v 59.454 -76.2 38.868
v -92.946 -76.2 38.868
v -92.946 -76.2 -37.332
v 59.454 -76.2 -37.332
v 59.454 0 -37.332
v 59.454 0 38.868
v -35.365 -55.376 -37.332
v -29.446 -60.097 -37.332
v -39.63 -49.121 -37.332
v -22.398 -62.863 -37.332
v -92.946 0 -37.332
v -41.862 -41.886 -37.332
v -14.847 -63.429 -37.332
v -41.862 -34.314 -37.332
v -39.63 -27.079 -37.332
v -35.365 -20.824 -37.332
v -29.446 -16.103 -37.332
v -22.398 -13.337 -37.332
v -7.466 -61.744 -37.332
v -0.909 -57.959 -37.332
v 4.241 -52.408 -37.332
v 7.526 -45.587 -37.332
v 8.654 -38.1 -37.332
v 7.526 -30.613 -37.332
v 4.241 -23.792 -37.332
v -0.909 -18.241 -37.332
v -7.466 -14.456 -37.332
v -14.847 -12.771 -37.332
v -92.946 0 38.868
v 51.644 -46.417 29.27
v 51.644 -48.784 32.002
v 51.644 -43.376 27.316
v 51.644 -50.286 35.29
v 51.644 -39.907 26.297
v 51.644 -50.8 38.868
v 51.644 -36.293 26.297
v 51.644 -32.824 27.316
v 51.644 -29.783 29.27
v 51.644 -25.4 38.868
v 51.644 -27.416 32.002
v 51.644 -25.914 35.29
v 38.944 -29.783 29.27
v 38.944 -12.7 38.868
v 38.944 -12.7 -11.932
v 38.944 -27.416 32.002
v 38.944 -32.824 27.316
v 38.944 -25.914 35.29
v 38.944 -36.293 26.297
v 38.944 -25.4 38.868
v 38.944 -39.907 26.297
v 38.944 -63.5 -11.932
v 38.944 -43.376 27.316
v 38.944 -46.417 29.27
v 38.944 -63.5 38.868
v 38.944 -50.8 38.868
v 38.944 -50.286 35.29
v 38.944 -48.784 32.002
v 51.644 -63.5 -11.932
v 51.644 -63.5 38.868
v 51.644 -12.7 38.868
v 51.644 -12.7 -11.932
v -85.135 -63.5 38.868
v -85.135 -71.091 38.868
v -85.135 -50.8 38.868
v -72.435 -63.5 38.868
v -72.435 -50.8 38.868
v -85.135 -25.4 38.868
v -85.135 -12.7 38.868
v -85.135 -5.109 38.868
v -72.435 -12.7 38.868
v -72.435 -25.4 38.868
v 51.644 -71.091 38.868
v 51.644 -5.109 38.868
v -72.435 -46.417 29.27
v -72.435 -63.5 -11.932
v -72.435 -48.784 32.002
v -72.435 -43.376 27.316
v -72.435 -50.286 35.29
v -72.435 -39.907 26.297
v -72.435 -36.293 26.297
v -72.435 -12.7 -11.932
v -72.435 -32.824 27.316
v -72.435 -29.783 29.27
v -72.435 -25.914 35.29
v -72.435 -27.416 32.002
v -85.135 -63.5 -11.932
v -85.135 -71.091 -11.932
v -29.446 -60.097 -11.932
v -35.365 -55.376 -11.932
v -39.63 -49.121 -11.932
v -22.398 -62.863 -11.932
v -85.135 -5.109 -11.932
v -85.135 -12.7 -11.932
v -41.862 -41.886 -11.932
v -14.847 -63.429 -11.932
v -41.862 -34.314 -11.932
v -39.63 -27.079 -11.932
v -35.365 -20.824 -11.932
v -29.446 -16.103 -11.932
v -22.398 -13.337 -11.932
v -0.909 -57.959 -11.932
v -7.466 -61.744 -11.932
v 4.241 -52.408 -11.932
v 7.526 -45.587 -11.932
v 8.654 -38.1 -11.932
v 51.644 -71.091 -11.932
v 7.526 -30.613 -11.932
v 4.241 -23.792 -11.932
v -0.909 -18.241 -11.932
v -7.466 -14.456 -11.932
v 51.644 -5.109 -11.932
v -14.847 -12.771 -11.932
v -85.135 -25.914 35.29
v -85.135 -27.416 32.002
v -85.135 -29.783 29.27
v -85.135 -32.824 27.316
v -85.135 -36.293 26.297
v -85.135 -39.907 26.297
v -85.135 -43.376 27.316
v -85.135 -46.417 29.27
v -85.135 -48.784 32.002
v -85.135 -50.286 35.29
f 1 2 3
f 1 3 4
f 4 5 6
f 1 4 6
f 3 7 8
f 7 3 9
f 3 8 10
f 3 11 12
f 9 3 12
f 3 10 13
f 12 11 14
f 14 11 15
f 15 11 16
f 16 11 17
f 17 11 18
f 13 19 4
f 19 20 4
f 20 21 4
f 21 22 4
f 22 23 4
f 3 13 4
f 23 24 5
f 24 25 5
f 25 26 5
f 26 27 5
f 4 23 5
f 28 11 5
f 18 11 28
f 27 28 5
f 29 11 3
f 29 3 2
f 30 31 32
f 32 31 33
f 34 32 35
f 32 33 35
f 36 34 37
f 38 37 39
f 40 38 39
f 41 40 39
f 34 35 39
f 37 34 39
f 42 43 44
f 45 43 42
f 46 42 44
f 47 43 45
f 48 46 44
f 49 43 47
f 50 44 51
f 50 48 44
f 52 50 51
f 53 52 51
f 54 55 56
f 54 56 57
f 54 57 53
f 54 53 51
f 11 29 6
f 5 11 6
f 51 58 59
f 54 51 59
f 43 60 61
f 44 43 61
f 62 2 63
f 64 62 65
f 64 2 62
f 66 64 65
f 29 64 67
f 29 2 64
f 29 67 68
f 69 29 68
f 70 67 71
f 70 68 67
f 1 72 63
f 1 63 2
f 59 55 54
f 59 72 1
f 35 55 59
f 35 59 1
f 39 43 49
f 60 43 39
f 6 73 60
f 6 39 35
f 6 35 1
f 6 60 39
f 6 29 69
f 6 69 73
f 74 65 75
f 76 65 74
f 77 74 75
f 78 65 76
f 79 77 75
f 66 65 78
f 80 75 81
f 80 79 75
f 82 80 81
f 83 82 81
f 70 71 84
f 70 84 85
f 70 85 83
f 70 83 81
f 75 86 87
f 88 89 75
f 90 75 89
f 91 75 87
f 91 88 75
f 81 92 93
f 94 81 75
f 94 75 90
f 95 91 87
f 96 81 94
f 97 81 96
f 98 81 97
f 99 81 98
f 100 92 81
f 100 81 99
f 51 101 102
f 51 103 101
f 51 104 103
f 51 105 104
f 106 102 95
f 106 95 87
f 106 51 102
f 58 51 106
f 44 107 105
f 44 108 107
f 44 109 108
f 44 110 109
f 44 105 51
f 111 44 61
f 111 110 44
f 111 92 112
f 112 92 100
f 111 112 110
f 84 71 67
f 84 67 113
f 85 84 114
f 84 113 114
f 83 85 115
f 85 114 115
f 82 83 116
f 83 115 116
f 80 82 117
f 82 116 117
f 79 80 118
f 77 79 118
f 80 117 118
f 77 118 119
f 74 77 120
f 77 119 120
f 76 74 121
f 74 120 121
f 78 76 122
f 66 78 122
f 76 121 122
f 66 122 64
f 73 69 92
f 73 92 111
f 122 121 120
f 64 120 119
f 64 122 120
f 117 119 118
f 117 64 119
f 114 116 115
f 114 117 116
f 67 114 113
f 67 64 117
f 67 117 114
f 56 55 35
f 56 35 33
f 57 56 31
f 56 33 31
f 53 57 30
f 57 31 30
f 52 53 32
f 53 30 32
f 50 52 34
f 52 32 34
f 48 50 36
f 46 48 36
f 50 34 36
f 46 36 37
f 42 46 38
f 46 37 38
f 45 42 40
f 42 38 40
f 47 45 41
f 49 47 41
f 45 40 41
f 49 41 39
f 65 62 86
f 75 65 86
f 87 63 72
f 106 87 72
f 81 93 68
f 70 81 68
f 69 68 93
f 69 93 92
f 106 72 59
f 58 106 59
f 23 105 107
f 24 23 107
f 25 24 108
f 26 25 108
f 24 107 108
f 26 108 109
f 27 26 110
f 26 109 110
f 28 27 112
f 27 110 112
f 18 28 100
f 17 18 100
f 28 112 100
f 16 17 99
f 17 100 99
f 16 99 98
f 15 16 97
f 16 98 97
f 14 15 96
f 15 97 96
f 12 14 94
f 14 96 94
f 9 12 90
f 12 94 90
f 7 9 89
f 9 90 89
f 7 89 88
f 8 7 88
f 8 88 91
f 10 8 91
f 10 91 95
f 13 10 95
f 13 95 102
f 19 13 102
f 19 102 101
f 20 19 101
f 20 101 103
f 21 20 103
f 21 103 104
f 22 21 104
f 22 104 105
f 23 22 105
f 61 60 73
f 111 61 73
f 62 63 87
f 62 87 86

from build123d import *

# Parameters (mm, degrees)
F0_W     = 152.4
F0_H     = 76.2
F1_DEPTH = 76.2
F2_W     = 136.779776
F2_H     = 65.982648
F3_DEPTH = 50.8
F5_DEPTH = 12.7
F7_DEPTH = 12.7
F8_R     = 25.4
F9_DEPTH = 66.04


with BuildPart() as f1:
    # F0 (on Front) → F1 (new body)
    with BuildSketch(Plane.XZ):
        with Locations((-16.745566, 0.768143)):
            Rectangle(F0_W, F0_H)
    extrude(amount=F1_DEPTH)

    # F2 (on face) → F3 (cut)
    with BuildSketch(Plane.XY.offset(38.868143)):
        with Locations((-16.745566, -38.1)):
            Rectangle(F2_W, F2_H)
    extrude(amount=-F3_DEPTH, mode=Mode.SUBTRACT)

    # F4 (on face) → F5 (join)
    with BuildSketch(Plane.YZ.offset(-85.135454)):
        with BuildLine():
            ThreePointArc((-25.4, 38.868143), (-38.1, 26.168143), (-50.8, 38.868143))
            Line((-50.8, 38.868143), (-63.5, 38.868143))
            Line((-63.5, 38.868143), (-63.5, -11.931857))
            Line((-63.5, -11.931857), (-12.7, -11.931857))
            Line((-12.7, -11.931857), (-12.7, 38.868143))
            Line((-12.7, 38.868143), (-25.4, 38.868143))
        make_face()
    extrude(amount=F5_DEPTH)

    # F6 (on face) → F7 (join)
    with BuildSketch(Plane(origin=(51.644322, 0, 0), x_dir=(0, -1, 0), z_dir=(-1, 0, 0))):
        with BuildLine():
            ThreePointArc((50.8, 38.868143), (38.1, 26.168143), (25.4, 38.868143))
            Line((25.4, 38.868143), (12.7, 38.868143))
            Line((12.7, 38.868143), (12.7, -11.931857))
            Line((12.7, -11.931857), (63.5, -11.931857))
            Line((63.5, -11.931857), (63.5, 38.868143))
            Line((63.5, 38.868143), (50.8, 38.868143))
        make_face()
    extrude(amount=F7_DEPTH)

    # F8 (on face) → F9 (cut)
    with BuildSketch(Plane.XY.offset(-11.931857)):
        with Locations((-16.745566, -38.1)):
            Circle(F8_R)
    extrude(amount=-F9_DEPTH, mode=Mode.SUBTRACT)


solid = f1.part
